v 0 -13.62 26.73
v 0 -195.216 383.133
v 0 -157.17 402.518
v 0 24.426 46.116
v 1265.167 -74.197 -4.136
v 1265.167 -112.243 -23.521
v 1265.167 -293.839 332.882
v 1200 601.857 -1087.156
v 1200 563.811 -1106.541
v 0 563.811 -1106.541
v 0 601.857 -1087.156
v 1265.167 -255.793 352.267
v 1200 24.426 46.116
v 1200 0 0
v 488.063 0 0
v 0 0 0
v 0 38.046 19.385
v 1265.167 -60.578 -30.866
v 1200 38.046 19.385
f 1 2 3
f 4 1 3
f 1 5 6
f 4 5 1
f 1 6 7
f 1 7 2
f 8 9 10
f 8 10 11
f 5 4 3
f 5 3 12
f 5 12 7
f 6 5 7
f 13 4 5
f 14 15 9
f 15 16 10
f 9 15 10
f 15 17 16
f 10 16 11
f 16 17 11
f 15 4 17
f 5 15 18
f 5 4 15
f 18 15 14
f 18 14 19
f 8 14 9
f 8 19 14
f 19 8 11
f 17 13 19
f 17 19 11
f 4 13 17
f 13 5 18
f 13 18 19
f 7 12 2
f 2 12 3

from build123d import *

# Parameters (mm, degrees)
BOSS_EXTRUDE1_DEPTH = 1200
BOSS_EXTRUDE2_DEPTH = 400
BOSS_EXTRUDE3_DEPTH = 30


with BuildPart() as part:
    # Sketch1 → Boss-Extrude1 (new body)
    with BuildSketch(Plane(origin=(0, 0, 0), x_dir=(0, 0, -1), z_dir=(1, 0, 0))):
        Polygon((0, 0), (1106.54100239, 563.810801627), (1087.155608051, 601.856780209), (-19.385394339, 38.045978583), align=None)
    extrude(amount=BOSS_EXTRUDE1_DEPTH)

    # Sketch3<3> → Boss-Extrude3 (add)
    with BuildSketch(Plane(origin=(0, -13.619714992, 26.730195726), x_dir=(1, 0, 0), z_dir=(0, -0.45399049973954797, 0.8910065241883675))):
        Polygon((556.279396443, 42.7), (0, 42.7), (1265.167266577, -67.98779329), (1200, 42.7), align=None)
    extrude(amount=-BOSS_EXTRUDE3_DEPTH)


with BuildPart() as body_2:
    # Sketch3 → Boss-Extrude2 (new body)
    with BuildSketch(Plane(origin=(0, -13.619714992, 26.730195726), x_dir=(1, 0, 0), z_dir=(0, -0.45399049973954797, 0.8910065241883675))):
        Polygon((1265.167266577, -67.98779329), (0, 42.7), (0, 0), (1265.167266577, -110.68779329), align=None)
    extrude(amount=BOSS_EXTRUDE2_DEPTH)


solid = Compound([part.part, body_2.part])
